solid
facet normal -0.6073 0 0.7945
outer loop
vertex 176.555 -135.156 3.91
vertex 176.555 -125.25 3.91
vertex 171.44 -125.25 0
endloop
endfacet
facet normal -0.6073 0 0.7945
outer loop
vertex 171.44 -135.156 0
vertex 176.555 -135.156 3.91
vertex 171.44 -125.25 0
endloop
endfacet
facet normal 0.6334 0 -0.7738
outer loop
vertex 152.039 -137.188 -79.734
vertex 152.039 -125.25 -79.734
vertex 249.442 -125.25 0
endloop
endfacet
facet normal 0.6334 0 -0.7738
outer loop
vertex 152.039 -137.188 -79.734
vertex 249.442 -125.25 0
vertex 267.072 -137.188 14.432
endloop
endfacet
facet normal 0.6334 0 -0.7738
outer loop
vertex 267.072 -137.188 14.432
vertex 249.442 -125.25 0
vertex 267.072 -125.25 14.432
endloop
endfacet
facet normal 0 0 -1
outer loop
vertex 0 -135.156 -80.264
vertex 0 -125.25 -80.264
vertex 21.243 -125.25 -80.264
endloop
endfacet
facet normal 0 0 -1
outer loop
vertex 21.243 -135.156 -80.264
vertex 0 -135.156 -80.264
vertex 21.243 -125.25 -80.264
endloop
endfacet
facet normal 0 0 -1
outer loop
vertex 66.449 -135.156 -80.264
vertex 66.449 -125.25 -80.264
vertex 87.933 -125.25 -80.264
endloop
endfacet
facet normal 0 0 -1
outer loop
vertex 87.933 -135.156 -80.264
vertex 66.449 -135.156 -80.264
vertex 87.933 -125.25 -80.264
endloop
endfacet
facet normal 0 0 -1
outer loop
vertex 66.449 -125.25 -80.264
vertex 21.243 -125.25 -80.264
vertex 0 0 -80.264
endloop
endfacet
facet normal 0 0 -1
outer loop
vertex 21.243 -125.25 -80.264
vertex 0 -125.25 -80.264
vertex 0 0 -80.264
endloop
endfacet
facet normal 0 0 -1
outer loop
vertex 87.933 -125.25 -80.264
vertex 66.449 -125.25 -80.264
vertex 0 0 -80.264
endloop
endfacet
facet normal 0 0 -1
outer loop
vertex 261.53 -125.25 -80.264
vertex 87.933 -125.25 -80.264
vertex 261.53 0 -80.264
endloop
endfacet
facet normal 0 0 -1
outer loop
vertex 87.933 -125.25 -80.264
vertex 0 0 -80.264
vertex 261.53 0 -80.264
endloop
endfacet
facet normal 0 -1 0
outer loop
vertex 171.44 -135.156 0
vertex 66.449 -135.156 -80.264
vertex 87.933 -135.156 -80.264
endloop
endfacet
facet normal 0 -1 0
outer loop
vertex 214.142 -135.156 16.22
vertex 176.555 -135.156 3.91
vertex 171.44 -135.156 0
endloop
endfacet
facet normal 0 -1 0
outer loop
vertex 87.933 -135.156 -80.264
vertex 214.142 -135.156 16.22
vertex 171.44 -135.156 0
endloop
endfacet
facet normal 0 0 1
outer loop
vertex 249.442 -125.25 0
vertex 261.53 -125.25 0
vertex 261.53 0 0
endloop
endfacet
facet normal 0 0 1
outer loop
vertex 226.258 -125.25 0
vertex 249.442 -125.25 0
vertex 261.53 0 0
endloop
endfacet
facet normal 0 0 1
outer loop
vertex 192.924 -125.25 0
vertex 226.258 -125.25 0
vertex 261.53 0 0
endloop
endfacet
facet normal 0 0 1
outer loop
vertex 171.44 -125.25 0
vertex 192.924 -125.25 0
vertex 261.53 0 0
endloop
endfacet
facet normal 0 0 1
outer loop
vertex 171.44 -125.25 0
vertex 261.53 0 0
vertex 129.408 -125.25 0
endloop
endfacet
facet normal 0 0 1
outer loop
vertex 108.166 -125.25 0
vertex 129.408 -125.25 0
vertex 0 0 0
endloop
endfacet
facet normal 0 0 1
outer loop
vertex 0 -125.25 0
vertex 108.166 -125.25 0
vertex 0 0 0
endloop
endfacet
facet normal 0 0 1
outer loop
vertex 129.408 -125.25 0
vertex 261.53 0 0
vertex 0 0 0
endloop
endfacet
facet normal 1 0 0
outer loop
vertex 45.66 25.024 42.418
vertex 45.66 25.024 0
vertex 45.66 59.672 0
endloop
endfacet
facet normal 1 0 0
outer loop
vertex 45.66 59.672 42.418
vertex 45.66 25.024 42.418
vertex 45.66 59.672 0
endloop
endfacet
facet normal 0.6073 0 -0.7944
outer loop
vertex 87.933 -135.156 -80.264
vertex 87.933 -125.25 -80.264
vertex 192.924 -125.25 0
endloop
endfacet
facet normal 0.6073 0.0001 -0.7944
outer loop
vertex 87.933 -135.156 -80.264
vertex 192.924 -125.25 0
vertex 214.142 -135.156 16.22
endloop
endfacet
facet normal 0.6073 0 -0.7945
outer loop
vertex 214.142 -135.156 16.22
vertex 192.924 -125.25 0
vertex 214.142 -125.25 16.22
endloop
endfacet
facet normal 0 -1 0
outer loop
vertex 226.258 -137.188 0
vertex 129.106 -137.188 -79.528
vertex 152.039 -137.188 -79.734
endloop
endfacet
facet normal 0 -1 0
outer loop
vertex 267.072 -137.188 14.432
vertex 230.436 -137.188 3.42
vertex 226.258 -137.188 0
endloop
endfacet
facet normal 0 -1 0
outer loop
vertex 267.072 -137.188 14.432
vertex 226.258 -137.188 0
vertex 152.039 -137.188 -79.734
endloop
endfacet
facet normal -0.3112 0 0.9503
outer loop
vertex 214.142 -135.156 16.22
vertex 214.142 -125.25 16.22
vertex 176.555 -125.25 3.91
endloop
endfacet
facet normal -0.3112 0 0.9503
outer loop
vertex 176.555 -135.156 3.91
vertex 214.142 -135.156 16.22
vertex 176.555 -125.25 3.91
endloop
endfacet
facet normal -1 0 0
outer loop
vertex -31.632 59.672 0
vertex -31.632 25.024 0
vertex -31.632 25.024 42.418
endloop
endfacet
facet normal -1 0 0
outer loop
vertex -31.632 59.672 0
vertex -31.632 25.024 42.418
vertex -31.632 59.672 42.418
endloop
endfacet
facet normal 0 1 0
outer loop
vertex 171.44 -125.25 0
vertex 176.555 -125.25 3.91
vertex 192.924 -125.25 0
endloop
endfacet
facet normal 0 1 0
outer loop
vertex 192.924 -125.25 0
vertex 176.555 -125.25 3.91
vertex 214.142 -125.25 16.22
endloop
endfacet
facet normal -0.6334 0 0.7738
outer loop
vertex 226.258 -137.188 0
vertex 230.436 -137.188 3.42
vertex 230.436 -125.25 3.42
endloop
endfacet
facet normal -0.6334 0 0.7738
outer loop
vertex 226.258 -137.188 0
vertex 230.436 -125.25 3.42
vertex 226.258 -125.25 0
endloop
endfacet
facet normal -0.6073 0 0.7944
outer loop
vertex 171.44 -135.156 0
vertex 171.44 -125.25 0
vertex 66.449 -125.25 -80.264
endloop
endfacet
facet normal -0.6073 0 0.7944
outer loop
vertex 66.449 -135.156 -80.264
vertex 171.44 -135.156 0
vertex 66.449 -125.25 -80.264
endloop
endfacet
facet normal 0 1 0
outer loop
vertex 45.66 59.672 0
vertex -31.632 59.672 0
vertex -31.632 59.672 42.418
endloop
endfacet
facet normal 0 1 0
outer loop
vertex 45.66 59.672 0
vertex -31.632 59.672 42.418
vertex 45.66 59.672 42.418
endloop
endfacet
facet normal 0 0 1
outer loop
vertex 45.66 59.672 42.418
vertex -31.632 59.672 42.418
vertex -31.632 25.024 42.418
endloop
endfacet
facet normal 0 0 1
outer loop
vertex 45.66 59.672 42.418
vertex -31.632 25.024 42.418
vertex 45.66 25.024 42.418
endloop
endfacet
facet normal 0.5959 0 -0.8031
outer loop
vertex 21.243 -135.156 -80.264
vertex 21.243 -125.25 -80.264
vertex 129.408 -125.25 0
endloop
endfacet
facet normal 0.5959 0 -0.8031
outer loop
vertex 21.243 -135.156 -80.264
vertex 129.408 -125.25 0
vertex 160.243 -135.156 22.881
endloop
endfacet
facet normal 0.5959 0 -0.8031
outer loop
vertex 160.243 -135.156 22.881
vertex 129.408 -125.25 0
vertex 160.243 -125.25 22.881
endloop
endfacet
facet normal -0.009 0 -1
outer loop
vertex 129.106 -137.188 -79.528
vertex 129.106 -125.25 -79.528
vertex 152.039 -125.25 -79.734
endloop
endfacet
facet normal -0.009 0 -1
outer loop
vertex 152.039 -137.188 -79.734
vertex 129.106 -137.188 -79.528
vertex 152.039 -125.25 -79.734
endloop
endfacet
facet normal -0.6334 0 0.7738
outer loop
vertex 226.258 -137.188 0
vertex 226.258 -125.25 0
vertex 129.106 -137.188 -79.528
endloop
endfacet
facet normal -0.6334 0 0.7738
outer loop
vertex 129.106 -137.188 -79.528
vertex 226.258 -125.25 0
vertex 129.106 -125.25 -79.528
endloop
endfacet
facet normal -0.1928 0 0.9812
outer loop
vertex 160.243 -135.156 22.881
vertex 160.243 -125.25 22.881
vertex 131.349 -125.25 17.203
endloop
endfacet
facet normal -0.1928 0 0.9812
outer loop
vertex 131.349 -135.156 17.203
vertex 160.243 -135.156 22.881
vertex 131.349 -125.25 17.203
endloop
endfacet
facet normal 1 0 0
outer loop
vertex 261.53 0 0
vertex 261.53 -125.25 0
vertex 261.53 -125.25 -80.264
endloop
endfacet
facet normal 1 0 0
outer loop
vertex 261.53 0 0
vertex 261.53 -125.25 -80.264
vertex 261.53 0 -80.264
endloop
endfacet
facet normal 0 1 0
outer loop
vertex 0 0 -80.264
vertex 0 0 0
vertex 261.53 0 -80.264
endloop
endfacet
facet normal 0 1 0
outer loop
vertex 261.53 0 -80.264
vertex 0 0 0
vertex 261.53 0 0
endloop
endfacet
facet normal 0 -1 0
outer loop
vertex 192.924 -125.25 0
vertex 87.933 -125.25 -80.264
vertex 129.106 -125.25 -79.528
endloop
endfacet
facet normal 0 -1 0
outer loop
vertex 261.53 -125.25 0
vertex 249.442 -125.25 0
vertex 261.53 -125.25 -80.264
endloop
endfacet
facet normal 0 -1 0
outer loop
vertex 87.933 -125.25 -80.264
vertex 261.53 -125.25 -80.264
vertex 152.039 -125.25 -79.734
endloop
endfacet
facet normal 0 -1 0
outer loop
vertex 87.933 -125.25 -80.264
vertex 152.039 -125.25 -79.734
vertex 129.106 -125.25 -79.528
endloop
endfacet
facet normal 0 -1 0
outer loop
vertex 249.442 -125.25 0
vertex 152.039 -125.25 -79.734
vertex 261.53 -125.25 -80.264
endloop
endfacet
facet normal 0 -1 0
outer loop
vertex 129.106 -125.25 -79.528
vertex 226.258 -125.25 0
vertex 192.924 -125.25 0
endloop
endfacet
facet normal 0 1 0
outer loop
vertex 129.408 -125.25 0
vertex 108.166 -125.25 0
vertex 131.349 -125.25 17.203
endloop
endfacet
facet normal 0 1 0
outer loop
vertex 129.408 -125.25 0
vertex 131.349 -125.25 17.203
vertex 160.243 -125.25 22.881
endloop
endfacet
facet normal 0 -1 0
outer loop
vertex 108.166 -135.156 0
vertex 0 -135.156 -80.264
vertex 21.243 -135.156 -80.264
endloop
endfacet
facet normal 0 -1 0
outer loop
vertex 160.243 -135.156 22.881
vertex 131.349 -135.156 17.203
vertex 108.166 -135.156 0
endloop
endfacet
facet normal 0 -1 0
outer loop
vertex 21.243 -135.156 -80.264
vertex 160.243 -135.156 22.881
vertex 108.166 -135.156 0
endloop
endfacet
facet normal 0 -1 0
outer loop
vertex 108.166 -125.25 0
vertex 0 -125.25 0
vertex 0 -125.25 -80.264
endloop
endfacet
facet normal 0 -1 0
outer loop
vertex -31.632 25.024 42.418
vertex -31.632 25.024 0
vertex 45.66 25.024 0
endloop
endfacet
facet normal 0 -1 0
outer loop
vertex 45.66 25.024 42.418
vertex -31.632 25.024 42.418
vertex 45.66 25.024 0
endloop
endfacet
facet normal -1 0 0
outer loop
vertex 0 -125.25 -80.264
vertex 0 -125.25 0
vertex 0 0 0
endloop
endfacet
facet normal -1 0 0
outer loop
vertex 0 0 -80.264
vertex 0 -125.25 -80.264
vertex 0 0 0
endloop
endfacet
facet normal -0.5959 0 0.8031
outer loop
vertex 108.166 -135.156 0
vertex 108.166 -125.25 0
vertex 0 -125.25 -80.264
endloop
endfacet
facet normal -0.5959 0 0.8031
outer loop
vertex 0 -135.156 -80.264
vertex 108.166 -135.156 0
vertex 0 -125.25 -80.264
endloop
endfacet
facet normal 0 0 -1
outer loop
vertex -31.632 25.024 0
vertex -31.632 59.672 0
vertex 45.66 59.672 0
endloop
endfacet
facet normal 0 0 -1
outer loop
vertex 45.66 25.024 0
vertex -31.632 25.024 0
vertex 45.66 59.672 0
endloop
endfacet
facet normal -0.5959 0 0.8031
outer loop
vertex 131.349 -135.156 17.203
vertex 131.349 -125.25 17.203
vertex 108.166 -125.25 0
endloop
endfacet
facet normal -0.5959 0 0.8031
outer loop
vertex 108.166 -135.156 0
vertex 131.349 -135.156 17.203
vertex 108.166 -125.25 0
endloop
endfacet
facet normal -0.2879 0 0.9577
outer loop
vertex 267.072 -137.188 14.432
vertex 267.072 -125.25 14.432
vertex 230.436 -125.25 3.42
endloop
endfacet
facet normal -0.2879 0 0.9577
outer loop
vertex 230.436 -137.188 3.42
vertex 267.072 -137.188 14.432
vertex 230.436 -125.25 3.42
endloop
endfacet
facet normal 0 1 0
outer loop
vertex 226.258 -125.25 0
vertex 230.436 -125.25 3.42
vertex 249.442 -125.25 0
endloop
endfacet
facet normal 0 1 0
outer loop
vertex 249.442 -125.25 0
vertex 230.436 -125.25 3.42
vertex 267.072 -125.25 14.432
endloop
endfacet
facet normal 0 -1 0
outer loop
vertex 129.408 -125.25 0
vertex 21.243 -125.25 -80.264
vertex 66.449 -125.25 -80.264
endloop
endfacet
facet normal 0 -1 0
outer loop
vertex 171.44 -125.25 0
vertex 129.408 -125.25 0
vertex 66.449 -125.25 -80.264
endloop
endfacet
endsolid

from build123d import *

# Parameters (mm, degrees)
F0_W     = 261.5295350552
F0_H     = 125.2499073744
F1_DEPTH = 80.264
F2_W     = 77.2916898131
F2_H     = 34.648001194
F3_DEPTH = 42.418
F5_DEPTH = 9.906
F6_DEPTH = 9.906
F8_DEPTH = 11.938


with BuildPart() as f1:
    # F0 (on Top) → F1 (new body)
    with BuildSketch(Plane.XY):
        with Locations((130.7647675276, -62.6249536872)):
            Rectangle(F0_W, F0_H)
    extrude(amount=-F1_DEPTH)

    # F4 (on face) → F5 (join)
    with BuildSketch(Plane.XZ.offset(125.2499073744)):
        Polygon((108.1656721705, 0), (0, -80.264), (21.2426222861, -80.264), (129.4082944565, 0), align=None)
    extrude(amount=F5_DEPTH)

    # F4 (on face) → F6 (join)
    with BuildSketch(Plane.XZ.offset(125.2499073744)):
        Polygon((131.3489079475, 17.2030478716), (108.1656721705, 0), (129.4082944565, 0), (160.2432873569, 22.8810104028), align=None)
        Polygon((171.4400309796, 0), (66.4488598704, -80.264), (87.933011353, -80.264), (192.9241824621, 0), align=None)
        Polygon((176.5551269054, 3.9104055613), (171.4400309796, 0), (192.9241824621, 0), (214.1415250586, 16.2203046997), align=None)
    extrude(amount=F6_DEPTH)

    # F7 (on face) → F8 (join)
    with BuildSketch(Plane.XZ.offset(125.2499073744)):
        Polygon((230.4361462593, 3.4204390831), (226.2577506167, 0), (249.4418286874, 0), (267.0718695542, 14.4319700613), align=None)
        Polygon((226.2577506167, 0), (129.1061639786, -79.5283913612), (152.0391106606, -79.7339677811), (249.4418286874, 0), align=None)
    extrude(amount=F8_DEPTH)


with BuildPart() as f3:
    # F2 (on Top) → F3 (new body)
    with BuildSketch(Plane.XY):
        with Locations((7.0139430463, 42.3481091857)):
            Rectangle(F2_W, F2_H)
    extrude(amount=F3_DEPTH)


solid = Compound([f1.part, f3.part])
